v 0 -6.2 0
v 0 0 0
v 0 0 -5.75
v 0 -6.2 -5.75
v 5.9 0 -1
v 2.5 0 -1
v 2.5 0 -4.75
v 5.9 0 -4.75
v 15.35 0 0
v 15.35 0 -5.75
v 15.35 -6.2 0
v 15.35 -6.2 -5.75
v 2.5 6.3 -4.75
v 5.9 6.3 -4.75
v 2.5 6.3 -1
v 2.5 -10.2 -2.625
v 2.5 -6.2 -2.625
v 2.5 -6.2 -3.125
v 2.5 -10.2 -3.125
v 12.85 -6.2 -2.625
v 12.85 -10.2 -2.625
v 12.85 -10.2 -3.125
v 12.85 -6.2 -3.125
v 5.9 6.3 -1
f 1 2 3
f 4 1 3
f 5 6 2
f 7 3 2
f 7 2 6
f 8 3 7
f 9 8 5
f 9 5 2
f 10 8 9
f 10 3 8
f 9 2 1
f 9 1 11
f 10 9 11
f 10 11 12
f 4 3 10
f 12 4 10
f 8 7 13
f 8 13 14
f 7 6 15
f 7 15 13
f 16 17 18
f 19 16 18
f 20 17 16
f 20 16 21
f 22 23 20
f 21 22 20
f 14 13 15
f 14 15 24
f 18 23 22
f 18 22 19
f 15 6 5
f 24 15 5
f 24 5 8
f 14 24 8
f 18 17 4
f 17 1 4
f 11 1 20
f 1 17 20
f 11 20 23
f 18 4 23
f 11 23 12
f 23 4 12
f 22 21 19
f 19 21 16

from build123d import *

# Parameters (mm, degrees)
ESBO_O2_W                = 15.35
ESBO_O2_H                = 5.75
RESSALTO_EXTRUS_O1_DEPTH = 6.2
ESBO_O2_3_W              = 3.4
ESBO_O2_3_H              = 3.75
RESSALTO_EXTRUS_O2_DEPTH = 6.3
RESSALTO_EXTRUS_O3_DEPTH = 4


with BuildPart() as part:
    # Esboço2 → Ressalto-extrusão1 (new body)
    with BuildSketch(Plane(origin=(0, 0, 0), x_dir=(1, 0, 0), z_dir=(0, 1, 0))):
        with Locations((7.675, 2.875)):
            Rectangle(ESBO_O2_W, ESBO_O2_H)
    extrude(amount=-RESSALTO_EXTRUS_O1_DEPTH)

    # Esboço2<3> → Ressalto-extrusão2 (add)
    with BuildSketch(Plane(origin=(0, 0, 0), x_dir=(1, 0, 0), z_dir=(0, 1, 0))):
        with Locations((4.2, 2.875)):
            Rectangle(ESBO_O2_3_W, ESBO_O2_3_H)
    extrude(amount=RESSALTO_EXTRUS_O2_DEPTH)

    # Esboço3 → Ressalto-extrusão3 (add)
    with BuildSketch(Plane.XZ.offset(6.2)):
        Polygon((2.5, -2.875), (2.5, -2.625), (12.85, -2.625), (12.85, -2.875), (12.85, -3.125), (2.5, -3.125), align=None)
    extrude(amount=RESSALTO_EXTRUS_O3_DEPTH)


solid = part.part
